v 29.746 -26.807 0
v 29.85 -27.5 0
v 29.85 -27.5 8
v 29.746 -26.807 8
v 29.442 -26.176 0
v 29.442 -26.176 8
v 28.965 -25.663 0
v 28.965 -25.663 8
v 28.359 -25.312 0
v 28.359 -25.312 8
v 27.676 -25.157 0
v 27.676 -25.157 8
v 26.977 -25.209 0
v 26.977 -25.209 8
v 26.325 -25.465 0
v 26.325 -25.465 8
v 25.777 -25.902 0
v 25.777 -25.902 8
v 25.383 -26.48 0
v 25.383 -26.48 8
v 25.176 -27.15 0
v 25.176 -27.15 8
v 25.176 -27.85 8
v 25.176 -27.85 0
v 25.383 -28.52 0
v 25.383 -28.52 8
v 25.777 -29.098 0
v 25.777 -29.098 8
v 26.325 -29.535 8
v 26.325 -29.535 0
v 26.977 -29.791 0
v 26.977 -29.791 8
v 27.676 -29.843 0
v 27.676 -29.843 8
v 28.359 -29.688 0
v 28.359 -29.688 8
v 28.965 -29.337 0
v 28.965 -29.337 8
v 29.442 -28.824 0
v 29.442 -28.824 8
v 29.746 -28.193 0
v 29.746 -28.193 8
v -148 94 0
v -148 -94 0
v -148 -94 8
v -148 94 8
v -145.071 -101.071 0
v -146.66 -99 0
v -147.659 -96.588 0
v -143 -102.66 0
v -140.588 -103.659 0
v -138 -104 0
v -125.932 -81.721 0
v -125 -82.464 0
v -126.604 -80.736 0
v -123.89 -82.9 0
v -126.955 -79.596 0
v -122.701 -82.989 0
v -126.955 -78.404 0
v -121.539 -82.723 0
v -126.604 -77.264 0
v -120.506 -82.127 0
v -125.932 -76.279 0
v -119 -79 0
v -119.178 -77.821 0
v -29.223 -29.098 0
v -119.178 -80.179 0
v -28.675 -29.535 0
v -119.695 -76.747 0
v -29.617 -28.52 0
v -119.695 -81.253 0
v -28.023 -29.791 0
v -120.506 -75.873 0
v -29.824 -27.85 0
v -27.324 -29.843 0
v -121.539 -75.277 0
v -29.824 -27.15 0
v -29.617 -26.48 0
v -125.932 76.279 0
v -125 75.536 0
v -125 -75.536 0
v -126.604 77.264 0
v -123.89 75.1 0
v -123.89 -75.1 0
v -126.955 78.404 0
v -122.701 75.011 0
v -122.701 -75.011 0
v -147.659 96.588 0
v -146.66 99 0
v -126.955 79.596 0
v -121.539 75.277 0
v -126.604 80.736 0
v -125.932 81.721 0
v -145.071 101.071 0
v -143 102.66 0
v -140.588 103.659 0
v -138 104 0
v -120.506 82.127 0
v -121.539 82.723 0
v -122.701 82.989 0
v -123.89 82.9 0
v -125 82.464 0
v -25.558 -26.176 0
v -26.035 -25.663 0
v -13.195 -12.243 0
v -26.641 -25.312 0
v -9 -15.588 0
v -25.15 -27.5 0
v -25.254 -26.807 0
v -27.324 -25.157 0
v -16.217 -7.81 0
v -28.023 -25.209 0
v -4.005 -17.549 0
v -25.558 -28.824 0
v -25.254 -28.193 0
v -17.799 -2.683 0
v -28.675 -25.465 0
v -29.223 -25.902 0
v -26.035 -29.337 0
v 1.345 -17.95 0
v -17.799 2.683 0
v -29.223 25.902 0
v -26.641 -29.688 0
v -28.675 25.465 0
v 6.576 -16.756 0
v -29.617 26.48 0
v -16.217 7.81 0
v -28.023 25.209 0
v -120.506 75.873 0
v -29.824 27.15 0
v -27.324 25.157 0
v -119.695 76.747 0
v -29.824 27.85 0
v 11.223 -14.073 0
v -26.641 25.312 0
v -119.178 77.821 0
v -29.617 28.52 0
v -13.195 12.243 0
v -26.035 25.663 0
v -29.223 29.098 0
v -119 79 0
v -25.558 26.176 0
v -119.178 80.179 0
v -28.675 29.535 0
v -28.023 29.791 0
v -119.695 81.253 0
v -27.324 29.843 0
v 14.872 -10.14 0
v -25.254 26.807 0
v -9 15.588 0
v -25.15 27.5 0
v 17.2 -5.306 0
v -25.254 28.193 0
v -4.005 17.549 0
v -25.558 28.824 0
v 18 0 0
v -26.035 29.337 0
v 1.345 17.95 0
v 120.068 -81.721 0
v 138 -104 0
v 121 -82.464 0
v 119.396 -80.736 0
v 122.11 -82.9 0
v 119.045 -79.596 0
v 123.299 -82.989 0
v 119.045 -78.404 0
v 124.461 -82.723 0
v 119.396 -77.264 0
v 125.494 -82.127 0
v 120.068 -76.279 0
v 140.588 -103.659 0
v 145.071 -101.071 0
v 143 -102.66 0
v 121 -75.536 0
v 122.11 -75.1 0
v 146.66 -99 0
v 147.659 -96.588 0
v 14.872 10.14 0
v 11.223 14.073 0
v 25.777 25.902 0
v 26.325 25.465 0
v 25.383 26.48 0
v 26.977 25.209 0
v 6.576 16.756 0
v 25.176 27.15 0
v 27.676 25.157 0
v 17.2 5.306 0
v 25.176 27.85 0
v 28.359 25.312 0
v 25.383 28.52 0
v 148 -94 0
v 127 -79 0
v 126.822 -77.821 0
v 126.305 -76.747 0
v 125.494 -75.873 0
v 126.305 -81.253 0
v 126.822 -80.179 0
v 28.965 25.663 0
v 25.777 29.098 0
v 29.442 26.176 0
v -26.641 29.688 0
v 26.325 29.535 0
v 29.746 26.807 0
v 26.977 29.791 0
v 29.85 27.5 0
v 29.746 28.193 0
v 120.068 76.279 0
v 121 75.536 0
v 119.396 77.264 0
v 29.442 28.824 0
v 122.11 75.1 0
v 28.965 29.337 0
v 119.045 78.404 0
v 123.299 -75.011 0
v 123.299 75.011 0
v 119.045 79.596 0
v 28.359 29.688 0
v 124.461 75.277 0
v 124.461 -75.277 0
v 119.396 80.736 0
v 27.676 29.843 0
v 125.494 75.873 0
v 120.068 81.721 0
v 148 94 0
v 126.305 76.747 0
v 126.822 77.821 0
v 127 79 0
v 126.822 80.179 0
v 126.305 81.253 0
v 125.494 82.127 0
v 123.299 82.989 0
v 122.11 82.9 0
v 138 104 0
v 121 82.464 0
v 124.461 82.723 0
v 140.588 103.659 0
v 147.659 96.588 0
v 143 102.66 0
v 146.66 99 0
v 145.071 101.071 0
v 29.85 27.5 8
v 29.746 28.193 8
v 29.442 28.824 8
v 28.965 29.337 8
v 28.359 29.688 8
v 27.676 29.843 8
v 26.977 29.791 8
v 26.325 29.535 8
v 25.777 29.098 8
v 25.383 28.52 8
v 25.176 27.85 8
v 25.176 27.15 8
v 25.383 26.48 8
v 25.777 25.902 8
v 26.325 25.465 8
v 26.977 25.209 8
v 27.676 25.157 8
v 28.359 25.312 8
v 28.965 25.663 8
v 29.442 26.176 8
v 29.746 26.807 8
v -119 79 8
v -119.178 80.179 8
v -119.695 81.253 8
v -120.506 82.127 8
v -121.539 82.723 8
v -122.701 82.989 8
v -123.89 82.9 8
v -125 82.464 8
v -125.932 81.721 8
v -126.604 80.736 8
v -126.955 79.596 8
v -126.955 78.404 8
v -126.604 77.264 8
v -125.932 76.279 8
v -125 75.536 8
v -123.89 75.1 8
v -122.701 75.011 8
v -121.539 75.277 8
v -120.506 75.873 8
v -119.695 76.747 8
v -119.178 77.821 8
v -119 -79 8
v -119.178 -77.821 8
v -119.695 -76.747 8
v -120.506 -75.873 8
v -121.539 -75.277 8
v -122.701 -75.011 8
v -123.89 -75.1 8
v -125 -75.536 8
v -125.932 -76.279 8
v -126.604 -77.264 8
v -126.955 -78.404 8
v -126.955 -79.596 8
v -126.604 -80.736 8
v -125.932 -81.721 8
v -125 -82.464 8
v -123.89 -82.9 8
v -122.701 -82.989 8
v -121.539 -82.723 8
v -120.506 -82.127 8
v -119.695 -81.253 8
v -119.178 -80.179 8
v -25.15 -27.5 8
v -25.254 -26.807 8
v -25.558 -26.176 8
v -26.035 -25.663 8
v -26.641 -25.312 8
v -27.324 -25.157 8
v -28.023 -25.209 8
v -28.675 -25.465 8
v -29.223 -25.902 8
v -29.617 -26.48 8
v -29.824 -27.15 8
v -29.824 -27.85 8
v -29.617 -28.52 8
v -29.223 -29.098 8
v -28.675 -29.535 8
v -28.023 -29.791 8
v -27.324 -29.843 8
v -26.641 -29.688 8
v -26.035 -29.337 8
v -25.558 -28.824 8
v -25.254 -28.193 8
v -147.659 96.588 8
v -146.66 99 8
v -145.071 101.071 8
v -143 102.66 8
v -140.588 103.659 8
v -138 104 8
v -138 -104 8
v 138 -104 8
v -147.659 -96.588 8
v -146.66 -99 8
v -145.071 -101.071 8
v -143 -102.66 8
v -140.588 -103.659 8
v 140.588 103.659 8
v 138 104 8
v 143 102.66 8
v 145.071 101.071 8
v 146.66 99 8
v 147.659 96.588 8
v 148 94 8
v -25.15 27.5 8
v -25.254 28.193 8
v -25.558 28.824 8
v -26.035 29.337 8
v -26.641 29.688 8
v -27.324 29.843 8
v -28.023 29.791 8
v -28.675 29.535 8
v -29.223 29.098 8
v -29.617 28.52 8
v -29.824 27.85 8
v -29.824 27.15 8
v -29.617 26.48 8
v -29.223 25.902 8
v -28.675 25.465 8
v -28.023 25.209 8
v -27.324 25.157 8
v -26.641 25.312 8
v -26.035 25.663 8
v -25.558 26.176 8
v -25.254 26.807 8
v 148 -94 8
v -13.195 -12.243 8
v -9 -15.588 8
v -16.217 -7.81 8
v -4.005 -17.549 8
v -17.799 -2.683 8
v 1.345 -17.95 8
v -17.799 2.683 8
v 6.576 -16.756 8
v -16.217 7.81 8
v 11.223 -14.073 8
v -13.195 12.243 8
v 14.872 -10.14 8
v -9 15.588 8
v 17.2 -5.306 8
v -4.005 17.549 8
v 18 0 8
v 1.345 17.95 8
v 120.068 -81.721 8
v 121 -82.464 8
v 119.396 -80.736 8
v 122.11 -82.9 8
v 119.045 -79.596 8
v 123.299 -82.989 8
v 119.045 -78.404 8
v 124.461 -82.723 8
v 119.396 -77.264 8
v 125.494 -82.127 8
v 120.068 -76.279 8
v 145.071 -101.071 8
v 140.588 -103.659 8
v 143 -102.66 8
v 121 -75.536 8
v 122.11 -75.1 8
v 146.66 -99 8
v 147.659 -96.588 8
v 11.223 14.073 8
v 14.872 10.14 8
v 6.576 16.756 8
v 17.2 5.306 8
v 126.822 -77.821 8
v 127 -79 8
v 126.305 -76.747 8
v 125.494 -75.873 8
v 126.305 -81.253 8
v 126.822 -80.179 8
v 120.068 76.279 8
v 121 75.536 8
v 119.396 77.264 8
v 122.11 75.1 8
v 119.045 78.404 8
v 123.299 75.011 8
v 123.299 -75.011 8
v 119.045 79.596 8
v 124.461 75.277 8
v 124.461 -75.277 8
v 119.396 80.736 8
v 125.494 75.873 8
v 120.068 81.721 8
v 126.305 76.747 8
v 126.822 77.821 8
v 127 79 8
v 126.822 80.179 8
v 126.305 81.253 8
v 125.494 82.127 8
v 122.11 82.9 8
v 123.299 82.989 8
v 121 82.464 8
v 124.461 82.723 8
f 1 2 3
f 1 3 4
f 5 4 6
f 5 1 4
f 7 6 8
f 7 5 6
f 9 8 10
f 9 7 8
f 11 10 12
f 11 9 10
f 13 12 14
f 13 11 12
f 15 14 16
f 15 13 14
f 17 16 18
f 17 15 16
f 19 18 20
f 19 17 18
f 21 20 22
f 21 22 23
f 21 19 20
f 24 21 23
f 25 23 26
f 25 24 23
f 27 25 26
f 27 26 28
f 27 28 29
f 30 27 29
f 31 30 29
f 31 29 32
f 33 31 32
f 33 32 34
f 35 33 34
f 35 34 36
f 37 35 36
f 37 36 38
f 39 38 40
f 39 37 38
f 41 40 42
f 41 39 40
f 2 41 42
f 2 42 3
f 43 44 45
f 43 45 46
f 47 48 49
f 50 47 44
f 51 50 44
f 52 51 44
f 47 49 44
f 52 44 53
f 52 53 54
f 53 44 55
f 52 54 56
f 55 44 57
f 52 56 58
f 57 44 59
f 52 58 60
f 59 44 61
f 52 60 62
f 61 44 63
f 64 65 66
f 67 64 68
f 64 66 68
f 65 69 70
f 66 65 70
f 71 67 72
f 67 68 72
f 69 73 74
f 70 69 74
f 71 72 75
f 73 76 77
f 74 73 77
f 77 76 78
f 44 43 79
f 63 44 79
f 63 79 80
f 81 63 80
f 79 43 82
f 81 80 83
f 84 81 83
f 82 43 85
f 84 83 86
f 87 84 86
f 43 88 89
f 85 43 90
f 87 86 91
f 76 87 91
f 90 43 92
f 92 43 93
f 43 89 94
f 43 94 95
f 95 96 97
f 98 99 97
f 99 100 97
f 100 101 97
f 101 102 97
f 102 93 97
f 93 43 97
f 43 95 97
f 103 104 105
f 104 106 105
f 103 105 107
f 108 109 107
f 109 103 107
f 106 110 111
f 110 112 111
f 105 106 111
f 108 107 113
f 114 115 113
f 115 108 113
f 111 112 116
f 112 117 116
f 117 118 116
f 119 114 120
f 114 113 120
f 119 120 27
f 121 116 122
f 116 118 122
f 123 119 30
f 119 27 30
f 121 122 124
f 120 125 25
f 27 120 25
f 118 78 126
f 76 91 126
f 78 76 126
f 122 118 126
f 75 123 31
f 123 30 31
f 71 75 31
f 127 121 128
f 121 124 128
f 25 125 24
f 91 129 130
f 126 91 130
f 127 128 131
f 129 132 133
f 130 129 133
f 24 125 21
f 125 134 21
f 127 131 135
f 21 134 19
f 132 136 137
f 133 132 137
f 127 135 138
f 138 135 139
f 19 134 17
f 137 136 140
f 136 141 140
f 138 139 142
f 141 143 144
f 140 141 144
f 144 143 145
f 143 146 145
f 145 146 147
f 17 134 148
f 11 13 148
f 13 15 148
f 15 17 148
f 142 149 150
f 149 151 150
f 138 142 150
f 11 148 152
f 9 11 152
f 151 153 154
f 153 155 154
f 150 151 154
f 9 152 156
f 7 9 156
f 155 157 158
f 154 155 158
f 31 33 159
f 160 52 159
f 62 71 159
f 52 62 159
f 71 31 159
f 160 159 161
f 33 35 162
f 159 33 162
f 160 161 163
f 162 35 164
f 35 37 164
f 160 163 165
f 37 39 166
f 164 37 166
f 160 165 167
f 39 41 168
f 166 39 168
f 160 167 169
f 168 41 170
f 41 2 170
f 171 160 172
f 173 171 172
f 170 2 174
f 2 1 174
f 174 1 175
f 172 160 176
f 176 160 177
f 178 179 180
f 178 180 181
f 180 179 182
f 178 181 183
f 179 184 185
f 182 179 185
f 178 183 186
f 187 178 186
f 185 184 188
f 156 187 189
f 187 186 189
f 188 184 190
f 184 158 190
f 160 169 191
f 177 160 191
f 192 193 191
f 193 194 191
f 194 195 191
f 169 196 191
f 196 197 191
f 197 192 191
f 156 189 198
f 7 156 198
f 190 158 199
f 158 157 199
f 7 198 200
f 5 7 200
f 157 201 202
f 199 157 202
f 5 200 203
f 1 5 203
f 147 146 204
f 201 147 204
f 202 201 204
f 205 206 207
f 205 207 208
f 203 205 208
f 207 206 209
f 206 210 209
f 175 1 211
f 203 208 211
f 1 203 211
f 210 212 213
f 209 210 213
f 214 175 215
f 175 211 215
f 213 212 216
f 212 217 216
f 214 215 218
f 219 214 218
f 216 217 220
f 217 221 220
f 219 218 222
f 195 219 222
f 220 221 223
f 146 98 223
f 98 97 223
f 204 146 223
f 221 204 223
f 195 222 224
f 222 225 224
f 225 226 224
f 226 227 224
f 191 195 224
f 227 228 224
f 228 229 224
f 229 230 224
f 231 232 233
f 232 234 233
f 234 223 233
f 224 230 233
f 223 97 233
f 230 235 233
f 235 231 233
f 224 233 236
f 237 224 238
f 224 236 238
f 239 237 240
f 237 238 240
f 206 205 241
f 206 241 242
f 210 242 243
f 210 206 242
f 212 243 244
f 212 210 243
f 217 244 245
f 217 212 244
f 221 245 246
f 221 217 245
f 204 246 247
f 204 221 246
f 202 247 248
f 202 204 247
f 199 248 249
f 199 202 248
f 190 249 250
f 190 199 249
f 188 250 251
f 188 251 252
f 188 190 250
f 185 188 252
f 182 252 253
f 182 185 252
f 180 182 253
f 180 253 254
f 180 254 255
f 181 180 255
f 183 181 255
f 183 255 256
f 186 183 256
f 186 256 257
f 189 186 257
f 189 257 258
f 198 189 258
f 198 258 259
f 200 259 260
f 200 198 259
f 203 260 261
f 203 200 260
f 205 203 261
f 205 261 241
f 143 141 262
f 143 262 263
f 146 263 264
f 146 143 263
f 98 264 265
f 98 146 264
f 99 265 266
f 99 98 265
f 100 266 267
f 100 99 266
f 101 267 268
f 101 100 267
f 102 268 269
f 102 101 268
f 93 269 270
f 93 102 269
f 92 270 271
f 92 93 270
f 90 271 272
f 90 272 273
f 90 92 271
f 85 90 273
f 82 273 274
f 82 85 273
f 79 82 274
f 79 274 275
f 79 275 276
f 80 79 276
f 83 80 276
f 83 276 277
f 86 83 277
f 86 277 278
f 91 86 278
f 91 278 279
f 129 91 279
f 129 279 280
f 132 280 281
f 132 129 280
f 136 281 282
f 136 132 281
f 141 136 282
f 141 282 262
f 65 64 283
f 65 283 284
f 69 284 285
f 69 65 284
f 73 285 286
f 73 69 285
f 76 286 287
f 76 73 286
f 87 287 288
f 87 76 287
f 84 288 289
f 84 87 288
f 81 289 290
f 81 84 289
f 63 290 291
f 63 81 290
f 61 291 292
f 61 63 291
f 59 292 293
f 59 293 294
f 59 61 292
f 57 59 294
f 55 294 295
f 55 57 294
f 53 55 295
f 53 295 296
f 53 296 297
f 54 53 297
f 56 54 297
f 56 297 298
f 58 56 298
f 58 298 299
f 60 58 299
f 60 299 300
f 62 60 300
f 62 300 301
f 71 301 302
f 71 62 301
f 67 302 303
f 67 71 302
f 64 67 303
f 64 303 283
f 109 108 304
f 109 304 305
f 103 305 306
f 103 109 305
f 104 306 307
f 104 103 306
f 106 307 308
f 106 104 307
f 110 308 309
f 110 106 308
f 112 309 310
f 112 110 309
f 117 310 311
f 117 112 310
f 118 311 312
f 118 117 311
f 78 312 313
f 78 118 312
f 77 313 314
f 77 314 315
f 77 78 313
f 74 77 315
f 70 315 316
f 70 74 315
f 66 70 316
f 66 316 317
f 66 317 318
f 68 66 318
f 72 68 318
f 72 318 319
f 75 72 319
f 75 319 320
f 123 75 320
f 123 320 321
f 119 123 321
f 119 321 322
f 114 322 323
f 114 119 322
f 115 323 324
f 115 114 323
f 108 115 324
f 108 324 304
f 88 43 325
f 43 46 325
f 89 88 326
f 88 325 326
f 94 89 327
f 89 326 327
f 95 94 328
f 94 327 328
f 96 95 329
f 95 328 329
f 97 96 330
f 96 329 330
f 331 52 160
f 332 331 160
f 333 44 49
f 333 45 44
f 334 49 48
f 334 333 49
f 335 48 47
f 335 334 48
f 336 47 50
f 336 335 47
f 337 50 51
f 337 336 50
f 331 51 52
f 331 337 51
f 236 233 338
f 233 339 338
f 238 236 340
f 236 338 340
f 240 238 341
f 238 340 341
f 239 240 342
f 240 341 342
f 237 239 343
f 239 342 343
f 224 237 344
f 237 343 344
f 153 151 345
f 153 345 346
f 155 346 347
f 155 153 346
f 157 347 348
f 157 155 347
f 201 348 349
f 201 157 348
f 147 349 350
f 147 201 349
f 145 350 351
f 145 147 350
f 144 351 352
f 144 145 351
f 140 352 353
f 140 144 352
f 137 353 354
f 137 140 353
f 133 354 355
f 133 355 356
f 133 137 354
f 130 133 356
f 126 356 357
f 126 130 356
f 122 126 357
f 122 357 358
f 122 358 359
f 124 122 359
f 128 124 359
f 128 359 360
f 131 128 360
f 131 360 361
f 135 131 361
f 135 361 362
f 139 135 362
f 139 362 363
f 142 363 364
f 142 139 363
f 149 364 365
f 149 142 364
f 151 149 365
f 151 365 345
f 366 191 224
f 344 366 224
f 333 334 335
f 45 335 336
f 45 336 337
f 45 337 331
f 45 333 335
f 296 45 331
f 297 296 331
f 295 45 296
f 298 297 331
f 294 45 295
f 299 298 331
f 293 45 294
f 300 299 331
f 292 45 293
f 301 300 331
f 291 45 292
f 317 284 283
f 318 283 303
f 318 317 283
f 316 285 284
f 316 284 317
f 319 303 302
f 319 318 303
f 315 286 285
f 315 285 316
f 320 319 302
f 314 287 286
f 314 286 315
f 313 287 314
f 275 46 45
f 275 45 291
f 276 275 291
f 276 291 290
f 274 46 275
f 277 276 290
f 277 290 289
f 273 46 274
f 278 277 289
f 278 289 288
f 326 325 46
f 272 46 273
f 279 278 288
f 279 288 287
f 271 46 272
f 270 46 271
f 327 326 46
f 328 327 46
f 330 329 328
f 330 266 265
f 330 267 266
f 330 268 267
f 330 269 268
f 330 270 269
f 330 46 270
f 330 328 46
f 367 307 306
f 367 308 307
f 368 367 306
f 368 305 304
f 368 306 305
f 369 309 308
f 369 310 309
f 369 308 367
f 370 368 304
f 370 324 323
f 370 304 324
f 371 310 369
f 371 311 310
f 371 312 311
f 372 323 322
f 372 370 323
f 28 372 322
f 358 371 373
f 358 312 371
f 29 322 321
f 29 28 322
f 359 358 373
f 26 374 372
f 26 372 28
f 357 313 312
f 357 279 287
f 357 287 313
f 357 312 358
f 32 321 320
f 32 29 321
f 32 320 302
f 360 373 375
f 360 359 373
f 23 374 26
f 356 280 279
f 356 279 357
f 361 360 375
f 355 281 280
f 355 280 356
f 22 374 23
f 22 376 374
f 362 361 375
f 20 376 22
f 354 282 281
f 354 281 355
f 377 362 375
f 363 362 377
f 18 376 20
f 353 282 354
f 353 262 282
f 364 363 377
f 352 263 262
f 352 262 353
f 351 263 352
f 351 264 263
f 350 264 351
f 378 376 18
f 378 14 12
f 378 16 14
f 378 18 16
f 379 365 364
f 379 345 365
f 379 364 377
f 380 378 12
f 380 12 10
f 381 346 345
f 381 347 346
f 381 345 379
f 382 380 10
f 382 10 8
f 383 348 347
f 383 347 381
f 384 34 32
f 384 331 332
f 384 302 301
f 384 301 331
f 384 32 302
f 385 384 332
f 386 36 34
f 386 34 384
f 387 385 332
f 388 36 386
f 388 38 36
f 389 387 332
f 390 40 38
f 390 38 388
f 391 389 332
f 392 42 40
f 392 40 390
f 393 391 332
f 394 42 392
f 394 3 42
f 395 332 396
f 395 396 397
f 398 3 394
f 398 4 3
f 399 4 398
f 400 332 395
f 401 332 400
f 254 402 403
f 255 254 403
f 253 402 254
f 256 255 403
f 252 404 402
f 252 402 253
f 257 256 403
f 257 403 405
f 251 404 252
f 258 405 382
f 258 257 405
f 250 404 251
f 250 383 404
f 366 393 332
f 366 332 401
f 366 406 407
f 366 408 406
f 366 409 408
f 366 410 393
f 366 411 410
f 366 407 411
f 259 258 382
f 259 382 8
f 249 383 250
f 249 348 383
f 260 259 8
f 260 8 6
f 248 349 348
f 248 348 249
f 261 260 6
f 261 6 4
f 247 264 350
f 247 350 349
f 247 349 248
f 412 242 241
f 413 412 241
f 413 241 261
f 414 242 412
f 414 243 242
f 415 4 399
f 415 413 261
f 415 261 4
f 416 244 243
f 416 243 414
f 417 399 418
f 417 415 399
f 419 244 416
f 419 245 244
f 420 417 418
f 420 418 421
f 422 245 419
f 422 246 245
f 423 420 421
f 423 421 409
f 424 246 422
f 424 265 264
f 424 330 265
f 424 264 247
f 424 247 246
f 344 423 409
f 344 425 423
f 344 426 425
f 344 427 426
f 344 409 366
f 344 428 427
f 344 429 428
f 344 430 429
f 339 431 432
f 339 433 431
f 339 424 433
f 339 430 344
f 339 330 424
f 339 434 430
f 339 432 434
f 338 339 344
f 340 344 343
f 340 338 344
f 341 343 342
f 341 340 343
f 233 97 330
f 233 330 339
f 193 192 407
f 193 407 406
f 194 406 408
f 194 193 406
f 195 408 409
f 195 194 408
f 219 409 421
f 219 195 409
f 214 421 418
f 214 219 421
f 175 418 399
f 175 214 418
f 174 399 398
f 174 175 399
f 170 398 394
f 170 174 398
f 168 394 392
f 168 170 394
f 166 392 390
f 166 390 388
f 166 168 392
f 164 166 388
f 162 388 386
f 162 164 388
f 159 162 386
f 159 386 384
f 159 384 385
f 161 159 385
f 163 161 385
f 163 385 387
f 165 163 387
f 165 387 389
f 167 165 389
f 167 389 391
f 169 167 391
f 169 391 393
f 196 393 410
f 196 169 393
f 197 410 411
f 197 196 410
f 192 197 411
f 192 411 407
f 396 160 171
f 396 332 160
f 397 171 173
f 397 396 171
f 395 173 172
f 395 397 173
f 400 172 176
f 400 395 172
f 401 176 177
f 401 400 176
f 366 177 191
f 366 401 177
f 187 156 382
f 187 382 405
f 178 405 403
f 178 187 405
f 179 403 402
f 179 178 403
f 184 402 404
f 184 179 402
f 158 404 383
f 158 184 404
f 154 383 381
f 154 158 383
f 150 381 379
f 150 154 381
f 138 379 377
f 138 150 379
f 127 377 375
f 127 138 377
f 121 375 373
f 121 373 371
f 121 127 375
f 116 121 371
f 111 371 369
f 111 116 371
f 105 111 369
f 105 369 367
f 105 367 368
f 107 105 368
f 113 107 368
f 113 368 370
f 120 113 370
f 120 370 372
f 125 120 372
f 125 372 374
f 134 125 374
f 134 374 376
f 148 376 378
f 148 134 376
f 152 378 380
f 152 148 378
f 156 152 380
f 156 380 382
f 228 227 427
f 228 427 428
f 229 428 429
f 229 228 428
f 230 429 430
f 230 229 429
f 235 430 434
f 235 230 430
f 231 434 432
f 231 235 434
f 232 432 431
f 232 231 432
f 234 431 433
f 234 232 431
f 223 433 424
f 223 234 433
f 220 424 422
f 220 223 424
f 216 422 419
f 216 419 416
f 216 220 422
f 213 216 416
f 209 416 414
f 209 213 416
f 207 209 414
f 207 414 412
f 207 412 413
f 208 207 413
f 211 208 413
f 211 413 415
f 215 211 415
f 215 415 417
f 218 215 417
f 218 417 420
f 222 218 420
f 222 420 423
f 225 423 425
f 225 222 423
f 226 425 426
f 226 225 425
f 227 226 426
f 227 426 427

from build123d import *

# Parameters (mm, degrees)
F0_W     = 296
F0_H     = 208
F0_R     = 4
F0_R_2   = 2.35
F0_R_3   = 18
F1_DEPTH = 8
F2_R     = 10


with BuildPart() as f1:
    # F0 (on Top) → F1 (new body)
    with BuildSketch(Plane.XY):
        Rectangle(F0_W, F0_H)
        with Locations((-123, -79)):
            Circle(F0_R, mode=Mode.SUBTRACT)
        with Locations((-27.5, -27.5)):
            Circle(F0_R_2, mode=Mode.SUBTRACT)
        with Locations((123, -79)):
            Circle(F0_R, mode=Mode.SUBTRACT)
        with Locations((27.5, -27.5)):
            Circle(F0_R_2, mode=Mode.SUBTRACT)
        with Locations((-27.5, 27.5)):
            Circle(F0_R_2, mode=Mode.SUBTRACT)
        with Locations((-123, 79)):
            Circle(F0_R, mode=Mode.SUBTRACT)
        Circle(F0_R_3, mode=Mode.SUBTRACT)
        with Locations((27.5, 27.5)):
            Circle(F0_R_2, mode=Mode.SUBTRACT)
        with Locations((123, 79)):
            Circle(F0_R, mode=Mode.SUBTRACT)
    extrude(amount=F1_DEPTH)

    # F2
    f2_edges = [f1.edges().sort_by_distance(p)[0] for p in [
        (-148, 104, 4),
        (-148, -104, 4),
        (148, -104, 4),
        (148, 104, 4),
    ]]
    fillet(f2_edges, radius=F2_R)


solid = f1.part
